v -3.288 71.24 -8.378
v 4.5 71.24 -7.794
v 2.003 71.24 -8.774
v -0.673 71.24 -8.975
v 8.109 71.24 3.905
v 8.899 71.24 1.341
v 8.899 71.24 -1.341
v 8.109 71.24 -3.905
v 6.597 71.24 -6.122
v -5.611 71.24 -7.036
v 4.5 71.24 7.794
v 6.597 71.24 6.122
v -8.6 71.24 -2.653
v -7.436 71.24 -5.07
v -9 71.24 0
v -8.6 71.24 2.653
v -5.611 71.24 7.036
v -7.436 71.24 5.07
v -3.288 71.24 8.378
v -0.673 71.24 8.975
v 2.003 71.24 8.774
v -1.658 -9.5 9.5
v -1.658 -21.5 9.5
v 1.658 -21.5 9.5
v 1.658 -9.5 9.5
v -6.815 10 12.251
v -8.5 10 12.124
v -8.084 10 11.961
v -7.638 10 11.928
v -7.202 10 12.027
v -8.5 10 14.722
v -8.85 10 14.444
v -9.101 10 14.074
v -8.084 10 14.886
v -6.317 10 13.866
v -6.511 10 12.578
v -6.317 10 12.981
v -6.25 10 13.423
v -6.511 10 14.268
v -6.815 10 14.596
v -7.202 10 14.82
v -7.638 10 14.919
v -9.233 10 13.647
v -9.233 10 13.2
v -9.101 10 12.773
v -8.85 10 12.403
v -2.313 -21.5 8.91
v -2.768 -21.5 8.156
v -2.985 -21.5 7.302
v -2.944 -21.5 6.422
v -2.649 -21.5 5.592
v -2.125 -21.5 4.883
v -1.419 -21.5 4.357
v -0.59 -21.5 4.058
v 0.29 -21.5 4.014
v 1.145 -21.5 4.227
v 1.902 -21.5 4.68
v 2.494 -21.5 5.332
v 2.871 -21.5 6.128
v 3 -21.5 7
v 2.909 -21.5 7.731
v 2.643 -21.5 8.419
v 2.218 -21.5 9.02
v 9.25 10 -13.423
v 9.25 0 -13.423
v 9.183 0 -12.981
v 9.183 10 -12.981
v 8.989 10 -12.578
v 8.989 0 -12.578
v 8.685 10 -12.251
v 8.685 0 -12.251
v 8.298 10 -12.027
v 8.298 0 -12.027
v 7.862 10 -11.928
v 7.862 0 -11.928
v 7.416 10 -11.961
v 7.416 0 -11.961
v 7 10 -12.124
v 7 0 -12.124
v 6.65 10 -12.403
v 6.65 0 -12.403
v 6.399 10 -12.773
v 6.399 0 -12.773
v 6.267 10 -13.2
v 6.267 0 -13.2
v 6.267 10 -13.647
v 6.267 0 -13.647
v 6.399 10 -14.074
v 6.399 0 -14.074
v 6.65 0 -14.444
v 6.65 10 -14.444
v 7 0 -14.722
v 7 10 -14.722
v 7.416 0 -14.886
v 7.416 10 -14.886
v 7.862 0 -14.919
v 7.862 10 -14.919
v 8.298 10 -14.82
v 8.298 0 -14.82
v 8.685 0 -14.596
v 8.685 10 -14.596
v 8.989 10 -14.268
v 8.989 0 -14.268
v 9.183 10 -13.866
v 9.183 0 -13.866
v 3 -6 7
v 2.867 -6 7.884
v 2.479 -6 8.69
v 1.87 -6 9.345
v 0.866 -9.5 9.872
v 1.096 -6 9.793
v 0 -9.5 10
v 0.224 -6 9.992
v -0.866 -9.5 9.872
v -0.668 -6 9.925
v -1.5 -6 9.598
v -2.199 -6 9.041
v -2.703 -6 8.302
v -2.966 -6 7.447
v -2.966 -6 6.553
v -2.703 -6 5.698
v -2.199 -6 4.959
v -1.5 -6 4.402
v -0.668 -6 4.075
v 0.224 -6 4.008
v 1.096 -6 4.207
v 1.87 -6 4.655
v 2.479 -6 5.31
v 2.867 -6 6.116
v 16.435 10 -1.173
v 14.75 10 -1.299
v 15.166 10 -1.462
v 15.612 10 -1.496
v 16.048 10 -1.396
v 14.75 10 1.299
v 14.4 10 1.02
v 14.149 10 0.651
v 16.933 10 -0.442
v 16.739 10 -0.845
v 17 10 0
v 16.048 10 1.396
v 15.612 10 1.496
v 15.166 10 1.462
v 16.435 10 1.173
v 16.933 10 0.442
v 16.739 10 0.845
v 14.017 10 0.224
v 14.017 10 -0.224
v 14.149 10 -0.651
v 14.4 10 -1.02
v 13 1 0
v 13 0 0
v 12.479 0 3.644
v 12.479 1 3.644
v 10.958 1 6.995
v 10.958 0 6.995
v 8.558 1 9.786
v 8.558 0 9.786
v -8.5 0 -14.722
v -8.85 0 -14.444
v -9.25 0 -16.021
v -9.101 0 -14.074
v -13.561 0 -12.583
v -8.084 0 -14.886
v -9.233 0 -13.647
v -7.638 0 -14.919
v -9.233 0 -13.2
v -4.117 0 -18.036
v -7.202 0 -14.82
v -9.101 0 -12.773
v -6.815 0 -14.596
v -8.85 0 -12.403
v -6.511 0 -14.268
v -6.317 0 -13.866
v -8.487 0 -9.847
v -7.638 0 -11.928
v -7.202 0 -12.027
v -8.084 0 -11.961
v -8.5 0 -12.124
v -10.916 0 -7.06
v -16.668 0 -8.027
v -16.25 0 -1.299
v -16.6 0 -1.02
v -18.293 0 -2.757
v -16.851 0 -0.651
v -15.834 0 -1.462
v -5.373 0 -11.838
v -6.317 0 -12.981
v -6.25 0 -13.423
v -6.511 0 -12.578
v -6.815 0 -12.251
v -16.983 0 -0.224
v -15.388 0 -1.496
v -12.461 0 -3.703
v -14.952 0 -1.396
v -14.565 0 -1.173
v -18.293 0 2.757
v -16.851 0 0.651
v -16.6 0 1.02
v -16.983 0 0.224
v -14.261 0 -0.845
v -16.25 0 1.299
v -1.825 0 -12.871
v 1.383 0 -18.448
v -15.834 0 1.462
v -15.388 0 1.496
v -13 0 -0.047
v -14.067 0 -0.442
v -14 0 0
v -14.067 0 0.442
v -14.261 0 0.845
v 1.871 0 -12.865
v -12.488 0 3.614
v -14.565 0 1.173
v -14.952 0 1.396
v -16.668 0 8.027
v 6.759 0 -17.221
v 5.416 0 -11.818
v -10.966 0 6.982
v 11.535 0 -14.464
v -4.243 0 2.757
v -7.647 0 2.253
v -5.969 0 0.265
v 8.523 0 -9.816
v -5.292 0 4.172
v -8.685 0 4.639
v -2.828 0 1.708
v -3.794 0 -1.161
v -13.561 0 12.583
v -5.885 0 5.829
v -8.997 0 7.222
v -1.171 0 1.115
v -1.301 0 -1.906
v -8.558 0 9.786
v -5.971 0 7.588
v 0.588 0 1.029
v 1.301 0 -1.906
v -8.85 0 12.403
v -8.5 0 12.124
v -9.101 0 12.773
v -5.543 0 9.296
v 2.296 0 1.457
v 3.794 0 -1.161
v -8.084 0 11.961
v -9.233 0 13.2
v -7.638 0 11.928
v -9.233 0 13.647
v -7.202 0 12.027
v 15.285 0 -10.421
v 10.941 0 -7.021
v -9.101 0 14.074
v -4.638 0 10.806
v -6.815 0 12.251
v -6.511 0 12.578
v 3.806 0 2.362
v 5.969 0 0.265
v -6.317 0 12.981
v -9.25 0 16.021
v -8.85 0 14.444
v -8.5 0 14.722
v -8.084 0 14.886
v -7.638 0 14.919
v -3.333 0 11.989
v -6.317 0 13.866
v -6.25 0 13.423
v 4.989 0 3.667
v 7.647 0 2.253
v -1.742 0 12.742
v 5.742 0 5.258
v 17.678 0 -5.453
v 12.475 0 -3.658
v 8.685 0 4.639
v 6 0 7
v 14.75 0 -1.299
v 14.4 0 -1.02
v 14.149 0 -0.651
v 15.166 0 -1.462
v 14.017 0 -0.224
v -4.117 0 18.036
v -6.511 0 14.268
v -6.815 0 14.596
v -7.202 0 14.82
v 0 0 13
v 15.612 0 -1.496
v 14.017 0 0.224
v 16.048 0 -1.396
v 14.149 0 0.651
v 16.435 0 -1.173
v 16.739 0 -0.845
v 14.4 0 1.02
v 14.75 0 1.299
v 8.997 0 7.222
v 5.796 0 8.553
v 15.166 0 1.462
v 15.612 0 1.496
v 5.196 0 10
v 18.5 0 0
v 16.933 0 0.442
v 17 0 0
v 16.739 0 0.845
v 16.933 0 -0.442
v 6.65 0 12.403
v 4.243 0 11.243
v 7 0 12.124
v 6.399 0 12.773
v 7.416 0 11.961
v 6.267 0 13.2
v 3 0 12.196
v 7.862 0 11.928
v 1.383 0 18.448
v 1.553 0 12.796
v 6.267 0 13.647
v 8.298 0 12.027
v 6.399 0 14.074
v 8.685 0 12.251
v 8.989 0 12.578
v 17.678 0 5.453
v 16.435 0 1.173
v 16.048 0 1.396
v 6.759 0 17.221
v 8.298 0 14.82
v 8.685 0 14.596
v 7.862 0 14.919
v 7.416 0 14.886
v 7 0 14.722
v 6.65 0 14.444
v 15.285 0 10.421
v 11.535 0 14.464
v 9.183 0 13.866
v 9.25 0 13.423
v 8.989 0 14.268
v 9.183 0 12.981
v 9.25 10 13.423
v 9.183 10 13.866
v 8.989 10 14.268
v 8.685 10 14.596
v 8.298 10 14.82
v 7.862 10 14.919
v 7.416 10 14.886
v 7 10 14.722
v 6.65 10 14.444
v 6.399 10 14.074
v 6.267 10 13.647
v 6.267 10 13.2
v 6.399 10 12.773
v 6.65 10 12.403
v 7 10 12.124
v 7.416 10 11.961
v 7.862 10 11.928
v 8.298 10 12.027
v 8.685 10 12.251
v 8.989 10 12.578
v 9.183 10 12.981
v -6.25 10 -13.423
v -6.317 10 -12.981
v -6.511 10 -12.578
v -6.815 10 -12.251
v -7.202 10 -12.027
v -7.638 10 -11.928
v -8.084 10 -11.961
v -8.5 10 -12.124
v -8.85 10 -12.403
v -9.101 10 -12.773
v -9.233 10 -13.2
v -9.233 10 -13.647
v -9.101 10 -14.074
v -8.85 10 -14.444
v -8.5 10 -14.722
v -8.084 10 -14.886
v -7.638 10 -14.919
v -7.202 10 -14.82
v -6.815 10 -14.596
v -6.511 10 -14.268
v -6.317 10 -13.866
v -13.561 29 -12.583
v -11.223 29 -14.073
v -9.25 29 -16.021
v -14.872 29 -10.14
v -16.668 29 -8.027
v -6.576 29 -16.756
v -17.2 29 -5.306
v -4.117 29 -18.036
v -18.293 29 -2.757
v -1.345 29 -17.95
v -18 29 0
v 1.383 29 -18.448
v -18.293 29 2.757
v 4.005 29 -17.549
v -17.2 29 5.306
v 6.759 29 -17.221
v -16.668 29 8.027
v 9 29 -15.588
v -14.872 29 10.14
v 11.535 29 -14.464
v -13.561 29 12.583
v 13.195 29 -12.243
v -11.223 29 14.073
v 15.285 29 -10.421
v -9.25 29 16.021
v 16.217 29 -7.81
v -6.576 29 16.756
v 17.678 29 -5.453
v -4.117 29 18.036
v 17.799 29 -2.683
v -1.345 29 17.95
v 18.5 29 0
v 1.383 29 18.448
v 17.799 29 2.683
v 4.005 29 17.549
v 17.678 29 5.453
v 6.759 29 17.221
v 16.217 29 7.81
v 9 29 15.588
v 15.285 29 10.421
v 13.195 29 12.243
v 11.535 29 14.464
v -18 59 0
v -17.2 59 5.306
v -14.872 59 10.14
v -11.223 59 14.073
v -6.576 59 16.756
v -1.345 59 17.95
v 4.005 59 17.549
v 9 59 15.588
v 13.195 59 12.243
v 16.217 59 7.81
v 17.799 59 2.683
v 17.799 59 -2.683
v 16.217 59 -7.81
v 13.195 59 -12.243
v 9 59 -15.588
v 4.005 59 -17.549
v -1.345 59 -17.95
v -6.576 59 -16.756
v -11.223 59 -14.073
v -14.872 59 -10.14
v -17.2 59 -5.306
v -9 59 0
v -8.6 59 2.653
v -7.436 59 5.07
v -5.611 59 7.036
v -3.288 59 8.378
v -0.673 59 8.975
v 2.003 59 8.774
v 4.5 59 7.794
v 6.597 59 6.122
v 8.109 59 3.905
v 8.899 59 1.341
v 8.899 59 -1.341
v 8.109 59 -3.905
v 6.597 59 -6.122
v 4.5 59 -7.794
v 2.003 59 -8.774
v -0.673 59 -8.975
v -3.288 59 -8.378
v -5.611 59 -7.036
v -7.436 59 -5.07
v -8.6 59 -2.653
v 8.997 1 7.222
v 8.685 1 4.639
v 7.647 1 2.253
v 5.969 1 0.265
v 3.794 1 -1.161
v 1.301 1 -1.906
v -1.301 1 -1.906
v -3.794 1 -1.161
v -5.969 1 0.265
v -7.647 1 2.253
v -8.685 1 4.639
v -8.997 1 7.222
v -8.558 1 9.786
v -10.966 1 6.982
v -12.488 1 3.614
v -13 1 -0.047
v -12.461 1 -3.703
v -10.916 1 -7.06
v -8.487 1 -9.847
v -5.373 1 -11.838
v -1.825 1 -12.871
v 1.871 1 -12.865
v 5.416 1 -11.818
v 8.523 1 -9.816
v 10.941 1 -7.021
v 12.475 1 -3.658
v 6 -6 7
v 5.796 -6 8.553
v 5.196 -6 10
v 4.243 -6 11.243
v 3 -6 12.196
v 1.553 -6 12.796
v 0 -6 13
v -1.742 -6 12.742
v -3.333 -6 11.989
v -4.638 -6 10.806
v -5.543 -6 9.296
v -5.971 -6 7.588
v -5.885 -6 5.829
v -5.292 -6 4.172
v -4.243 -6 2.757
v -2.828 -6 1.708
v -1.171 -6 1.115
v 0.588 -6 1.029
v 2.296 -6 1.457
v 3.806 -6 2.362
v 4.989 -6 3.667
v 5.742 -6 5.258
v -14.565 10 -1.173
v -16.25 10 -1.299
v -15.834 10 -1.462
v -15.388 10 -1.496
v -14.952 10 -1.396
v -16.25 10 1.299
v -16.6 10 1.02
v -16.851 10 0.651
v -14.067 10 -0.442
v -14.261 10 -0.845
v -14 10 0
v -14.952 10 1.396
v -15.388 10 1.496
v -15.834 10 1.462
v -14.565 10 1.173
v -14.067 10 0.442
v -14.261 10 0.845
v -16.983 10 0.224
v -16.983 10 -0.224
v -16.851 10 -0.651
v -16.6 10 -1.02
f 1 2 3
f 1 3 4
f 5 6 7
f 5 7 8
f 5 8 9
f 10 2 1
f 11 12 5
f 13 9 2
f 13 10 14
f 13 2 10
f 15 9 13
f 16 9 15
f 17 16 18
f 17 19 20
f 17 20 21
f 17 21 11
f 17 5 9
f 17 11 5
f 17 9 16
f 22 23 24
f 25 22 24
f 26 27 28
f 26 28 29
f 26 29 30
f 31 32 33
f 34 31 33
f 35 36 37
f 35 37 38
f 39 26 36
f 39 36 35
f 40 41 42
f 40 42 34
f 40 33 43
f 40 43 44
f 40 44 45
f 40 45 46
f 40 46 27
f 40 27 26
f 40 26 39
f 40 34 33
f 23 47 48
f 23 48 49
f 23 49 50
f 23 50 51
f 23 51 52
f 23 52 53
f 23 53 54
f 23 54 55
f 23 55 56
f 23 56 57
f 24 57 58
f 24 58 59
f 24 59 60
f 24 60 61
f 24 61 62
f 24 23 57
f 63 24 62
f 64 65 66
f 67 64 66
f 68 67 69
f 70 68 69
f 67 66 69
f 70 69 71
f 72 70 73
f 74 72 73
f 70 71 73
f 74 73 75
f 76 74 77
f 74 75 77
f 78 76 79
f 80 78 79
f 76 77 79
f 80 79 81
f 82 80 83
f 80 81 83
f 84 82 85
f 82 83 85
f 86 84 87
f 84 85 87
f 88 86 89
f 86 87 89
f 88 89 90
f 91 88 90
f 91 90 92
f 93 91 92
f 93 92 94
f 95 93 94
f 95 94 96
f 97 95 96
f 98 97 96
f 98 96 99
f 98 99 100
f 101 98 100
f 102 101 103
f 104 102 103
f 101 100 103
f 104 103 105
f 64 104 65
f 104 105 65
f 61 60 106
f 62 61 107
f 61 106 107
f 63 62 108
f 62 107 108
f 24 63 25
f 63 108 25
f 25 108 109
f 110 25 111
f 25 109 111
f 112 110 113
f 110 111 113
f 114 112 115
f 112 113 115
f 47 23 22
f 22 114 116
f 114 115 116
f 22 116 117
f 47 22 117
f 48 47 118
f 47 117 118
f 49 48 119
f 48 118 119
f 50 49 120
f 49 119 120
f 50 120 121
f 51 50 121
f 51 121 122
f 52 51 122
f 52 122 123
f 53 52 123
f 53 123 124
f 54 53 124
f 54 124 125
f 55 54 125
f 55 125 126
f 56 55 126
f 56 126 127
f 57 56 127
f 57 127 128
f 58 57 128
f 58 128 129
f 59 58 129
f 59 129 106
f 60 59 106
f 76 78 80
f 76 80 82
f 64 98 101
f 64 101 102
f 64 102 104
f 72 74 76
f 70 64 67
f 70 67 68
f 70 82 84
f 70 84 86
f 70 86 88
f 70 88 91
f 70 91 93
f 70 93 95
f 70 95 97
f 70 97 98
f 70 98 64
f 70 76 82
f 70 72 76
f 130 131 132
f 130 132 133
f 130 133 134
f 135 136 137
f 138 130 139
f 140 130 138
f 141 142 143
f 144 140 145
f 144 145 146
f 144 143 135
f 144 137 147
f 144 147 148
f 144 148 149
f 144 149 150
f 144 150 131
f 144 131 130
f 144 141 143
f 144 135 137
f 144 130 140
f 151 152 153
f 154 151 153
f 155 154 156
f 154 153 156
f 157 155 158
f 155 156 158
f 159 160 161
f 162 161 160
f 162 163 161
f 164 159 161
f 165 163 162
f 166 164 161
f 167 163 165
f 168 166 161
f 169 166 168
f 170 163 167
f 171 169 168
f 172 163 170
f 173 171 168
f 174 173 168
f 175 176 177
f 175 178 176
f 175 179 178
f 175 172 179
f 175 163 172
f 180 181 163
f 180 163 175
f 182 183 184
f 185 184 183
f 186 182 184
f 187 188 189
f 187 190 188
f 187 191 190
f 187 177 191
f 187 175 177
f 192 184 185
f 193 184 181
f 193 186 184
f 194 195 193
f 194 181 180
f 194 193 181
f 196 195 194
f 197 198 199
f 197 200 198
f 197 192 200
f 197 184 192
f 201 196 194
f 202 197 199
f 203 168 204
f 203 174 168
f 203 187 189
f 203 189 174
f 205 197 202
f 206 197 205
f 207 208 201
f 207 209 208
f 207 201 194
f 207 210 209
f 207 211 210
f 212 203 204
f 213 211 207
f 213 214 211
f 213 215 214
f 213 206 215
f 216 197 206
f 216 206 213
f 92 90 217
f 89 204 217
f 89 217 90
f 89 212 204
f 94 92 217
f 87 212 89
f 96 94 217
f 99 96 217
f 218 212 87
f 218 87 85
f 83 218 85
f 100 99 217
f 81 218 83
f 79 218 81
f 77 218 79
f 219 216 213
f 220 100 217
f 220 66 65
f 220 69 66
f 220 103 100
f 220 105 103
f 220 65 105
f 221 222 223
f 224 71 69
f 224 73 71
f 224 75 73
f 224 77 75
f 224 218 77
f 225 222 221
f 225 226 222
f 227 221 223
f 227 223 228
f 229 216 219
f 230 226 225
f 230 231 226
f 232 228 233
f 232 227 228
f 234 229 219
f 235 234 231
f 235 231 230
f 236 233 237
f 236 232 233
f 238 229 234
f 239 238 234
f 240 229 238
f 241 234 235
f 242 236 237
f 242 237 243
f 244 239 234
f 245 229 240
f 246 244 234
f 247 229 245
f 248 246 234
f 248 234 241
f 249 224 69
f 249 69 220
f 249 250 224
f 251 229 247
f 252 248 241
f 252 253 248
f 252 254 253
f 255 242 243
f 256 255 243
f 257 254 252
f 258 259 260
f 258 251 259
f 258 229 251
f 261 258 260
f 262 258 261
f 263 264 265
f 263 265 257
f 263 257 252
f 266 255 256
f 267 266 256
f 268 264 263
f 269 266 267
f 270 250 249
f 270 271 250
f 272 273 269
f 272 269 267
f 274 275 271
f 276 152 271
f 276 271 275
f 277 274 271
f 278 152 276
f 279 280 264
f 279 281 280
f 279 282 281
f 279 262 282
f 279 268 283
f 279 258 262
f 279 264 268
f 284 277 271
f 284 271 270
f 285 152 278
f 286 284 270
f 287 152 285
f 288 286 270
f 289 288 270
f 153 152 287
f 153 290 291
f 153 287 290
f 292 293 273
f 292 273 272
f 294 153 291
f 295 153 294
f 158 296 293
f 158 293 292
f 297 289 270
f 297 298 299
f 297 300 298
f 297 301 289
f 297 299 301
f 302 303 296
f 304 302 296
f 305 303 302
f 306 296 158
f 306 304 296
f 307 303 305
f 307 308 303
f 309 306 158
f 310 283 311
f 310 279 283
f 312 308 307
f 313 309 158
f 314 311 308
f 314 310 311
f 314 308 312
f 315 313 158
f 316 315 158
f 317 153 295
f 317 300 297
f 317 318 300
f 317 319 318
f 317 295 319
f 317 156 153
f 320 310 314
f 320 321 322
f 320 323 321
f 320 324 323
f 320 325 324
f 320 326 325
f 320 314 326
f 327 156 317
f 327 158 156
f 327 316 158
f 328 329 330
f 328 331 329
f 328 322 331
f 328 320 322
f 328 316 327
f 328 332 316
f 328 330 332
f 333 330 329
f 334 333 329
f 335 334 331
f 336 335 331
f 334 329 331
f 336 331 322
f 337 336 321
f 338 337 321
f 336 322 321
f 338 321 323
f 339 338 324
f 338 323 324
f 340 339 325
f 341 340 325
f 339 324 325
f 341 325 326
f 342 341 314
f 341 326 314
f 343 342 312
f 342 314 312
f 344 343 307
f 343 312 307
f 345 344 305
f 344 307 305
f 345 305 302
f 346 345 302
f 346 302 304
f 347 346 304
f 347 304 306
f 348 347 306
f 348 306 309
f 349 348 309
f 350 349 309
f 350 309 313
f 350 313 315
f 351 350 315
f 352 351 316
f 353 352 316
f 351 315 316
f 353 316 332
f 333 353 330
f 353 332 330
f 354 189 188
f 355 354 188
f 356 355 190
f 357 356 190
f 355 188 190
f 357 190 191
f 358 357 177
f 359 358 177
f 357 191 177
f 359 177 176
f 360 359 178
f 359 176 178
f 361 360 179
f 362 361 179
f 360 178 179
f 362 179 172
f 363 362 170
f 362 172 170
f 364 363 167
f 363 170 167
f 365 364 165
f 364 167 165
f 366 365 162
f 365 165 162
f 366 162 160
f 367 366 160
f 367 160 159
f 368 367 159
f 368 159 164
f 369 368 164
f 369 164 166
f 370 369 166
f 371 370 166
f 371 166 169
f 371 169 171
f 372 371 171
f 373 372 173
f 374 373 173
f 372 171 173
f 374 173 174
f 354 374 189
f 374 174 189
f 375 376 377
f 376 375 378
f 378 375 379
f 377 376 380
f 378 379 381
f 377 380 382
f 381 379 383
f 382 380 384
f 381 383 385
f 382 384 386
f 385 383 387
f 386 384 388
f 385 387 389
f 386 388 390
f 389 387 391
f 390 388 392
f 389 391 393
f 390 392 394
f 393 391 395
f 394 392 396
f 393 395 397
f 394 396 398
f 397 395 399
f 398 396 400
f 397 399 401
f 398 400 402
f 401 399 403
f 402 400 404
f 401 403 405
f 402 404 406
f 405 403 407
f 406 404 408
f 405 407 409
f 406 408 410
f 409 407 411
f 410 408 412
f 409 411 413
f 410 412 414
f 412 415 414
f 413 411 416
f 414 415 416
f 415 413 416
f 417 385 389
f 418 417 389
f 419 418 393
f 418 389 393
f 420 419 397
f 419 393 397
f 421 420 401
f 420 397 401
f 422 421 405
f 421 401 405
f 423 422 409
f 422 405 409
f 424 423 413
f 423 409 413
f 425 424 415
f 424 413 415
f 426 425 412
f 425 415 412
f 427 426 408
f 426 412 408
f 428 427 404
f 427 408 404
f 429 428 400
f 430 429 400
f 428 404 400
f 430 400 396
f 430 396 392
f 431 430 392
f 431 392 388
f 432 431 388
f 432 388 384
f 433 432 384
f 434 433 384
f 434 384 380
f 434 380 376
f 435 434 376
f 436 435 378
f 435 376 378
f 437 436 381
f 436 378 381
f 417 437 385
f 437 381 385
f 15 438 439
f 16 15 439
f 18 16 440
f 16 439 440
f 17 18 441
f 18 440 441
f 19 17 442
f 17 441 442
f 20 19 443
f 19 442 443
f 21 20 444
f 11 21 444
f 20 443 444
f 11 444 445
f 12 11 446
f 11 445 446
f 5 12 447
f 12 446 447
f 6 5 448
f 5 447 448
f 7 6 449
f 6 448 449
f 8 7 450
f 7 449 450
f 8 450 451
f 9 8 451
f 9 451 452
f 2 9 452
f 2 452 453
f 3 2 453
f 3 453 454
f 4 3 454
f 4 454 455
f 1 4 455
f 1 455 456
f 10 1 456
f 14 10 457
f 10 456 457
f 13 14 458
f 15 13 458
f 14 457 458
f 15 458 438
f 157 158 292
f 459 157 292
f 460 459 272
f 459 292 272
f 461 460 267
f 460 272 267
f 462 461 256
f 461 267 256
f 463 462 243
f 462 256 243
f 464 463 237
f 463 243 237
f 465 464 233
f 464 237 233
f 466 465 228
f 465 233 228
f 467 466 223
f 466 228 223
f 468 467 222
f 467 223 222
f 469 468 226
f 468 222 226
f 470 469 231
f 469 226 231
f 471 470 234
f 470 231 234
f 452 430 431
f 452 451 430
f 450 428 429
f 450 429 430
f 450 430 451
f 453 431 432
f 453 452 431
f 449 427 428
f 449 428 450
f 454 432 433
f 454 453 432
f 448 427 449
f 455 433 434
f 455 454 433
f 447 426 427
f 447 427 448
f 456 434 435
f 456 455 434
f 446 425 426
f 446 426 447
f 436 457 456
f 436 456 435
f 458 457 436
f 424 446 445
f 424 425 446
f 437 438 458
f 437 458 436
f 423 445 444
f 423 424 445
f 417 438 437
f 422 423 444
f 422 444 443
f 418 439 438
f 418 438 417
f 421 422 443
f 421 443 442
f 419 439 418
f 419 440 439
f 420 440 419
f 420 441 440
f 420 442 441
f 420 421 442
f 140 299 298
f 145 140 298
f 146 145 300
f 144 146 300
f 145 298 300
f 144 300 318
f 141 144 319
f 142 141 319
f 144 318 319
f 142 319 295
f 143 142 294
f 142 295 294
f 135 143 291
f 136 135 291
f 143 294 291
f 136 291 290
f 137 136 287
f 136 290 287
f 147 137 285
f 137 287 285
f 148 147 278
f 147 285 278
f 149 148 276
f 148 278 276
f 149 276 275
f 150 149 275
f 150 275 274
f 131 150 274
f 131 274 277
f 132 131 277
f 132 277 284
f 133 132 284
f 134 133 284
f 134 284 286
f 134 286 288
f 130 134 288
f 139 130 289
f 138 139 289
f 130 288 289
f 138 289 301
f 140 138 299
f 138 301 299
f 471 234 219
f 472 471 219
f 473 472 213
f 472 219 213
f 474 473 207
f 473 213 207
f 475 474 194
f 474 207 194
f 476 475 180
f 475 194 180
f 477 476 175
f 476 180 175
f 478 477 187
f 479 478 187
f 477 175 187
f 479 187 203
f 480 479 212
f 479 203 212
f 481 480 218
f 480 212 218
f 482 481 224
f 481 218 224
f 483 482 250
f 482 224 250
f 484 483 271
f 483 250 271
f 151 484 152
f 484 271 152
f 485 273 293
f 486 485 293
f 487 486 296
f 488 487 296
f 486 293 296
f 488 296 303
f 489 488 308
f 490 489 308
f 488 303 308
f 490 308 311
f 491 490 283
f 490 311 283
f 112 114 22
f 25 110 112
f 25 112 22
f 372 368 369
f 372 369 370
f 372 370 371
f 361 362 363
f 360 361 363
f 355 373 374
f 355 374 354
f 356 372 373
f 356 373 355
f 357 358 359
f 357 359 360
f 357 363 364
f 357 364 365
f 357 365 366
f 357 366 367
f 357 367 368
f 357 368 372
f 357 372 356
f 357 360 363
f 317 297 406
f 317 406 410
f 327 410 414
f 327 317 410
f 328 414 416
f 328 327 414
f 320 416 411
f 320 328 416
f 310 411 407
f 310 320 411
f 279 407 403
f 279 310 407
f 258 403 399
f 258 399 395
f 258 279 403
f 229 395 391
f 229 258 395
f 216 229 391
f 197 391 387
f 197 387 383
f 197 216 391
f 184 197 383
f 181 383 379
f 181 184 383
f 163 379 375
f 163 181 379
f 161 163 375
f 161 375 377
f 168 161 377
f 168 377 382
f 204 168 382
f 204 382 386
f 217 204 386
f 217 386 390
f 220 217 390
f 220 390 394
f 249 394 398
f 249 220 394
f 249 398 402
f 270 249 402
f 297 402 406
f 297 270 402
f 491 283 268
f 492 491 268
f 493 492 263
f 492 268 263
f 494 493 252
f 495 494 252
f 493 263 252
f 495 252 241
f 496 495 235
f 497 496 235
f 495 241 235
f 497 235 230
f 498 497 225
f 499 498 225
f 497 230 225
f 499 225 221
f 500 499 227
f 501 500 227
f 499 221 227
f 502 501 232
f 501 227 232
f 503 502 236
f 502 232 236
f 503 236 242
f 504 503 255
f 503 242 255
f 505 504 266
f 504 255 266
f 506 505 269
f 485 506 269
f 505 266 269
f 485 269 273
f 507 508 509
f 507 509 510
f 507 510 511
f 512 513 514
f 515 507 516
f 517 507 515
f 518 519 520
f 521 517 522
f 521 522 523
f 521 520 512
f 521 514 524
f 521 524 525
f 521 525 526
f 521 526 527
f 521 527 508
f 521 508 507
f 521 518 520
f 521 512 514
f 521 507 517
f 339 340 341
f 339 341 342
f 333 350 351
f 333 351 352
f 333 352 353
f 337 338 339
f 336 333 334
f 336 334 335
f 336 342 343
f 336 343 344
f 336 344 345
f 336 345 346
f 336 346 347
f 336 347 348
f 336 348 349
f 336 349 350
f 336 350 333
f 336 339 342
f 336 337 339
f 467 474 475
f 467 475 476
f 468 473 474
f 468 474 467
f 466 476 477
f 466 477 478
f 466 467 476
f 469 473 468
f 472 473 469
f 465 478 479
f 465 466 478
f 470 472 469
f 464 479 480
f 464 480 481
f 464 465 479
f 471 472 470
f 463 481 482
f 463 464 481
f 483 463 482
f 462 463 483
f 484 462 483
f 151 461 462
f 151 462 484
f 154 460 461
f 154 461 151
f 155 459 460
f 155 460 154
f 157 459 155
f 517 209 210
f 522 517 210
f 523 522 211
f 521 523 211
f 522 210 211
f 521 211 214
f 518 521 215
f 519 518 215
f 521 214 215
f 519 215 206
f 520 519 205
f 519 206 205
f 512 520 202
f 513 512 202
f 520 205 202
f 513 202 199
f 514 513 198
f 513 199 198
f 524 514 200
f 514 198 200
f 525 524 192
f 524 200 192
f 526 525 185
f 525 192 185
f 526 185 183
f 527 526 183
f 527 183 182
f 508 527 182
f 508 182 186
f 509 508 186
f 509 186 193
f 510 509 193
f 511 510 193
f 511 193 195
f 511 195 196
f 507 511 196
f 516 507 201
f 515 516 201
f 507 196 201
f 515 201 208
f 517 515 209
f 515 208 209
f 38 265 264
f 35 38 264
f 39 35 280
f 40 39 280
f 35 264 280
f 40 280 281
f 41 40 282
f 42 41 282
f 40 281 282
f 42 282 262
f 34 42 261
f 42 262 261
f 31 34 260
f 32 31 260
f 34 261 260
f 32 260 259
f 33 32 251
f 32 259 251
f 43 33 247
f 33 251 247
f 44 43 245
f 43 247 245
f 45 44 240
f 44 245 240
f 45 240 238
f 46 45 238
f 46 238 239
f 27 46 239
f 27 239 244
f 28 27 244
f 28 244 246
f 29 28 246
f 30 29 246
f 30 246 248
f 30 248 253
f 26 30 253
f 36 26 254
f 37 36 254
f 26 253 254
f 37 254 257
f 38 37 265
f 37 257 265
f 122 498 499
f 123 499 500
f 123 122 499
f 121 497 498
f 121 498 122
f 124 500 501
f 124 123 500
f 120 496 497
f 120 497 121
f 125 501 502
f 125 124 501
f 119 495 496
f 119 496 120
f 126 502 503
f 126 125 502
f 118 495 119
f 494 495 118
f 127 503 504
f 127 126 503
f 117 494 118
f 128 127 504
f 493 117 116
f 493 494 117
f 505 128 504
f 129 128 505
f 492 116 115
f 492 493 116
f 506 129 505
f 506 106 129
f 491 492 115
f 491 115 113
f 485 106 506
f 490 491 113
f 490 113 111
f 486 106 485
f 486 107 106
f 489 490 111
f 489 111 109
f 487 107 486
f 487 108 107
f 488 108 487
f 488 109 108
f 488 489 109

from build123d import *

# Parameters (mm, degrees)
F0_R      = 18.5
F0_R_2    = 18
F0_R_3    = 1.5
F0_R_4    = 3
F1_DEPTH  = 29
F2_R      = 18
F3_DEPTH  = 30
F4_R      = 9
F5_DEPTH  = 12.24
F6_DEPTH  = 6
F7_DEPTH  = 21.5
F8_DEPTH  = 10
F10_DEPTH = 12
F11_DEPTH = 1


with BuildPart() as f1:
    # F0 (on Front) → F1 (new body)
    with BuildSketch(Plane.XZ):
        Circle(F0_R)
        Circle(F0_R_2, mode=Mode.SUBTRACT)
        Circle(F0_R_2)
        with Locations((-7.75, -13.4233937587)):
            Circle(F0_R_3, mode=Mode.SUBTRACT)
        with Locations((7.75, -13.4233937587)):
            Circle(F0_R_3, mode=Mode.SUBTRACT)
        with Locations((-15.5, 0)):
            Circle(F0_R_3, mode=Mode.SUBTRACT)
        with Locations((-7.75, 13.4233937587)):
            Circle(F0_R_3, mode=Mode.SUBTRACT)
        with BuildLine():
            ThreePointArc((-8.5580252347, 9.7857142857), (-4.5708705218, 12.1699278007), (-4.3e-08, 13))
            ThreePointArc((-4.3e-08, 13), (4.5708704815, 12.1699278158), (8.5580252347, 9.7857142857))
            ThreePointArc((8.5580252347, 9.7857142857), (11.8375320074, 5.3733449521), (13, 0))
            ThreePointArc((13, 0), (-5.3733449521, -11.8375320074), (-8.5580252347, 9.7857142857))
        make_face(mode=Mode.SUBTRACT)
        with Locations((15.5, 0)):
            Circle(F0_R_3, mode=Mode.SUBTRACT)
        with Locations((7.75, 13.4233937587)):
            Circle(F0_R_3, mode=Mode.SUBTRACT)
        with BuildLine():
            ThreePointArc((13, 0), (11.8375320074, 5.3733449521), (8.5580252347, 9.7857142857))
            ThreePointArc((8.5580252347, 9.7857142857), (0, -2), (-8.5580252347, 9.7857142857))
            ThreePointArc((-8.5580252347, 9.7857142857), (-5.3733449521, -11.8375320074), (13, 0))
        make_face()
        with BuildLine():
            ThreePointArc((8.5580252347, 9.7857142857), (4.5708704815, 12.1699278158), (-4.3e-08, 13))
            ThreePointArc((-4.3e-08, 13), (-4.5708705218, 12.1699278007), (-8.5580252347, 9.7857142857))
            ThreePointArc((-8.5580252347, 9.7857142857), (0, -2), (8.5580252347, 9.7857142857))
        make_face()
        with BuildLine():
            ThreePointArc((-4.3e-08, 13), (4.2426406719, 11.2426407023), (6, 7))
            ThreePointArc((6, 7), (-4.2426406719, 2.7573592977), (-4.3e-08, 13))
        make_face(mode=Mode.SUBTRACT)
        with BuildLine():
            ThreePointArc((-4.3e-08, 13), (-4.2426406719, 2.7573592977), (6, 7))
            ThreePointArc((6, 7), (4.2426406719, 11.2426407023), (-4.3e-08, 13))
        make_face()
        with Locations((0, 7)):
            Circle(F0_R_4, mode=Mode.SUBTRACT)
        with Locations((0, 7)):
            Circle(F0_R_4)
        with Locations((-15.5, 0)):
            Circle(F0_R_3)
        with Locations((7.75, -13.4233937587)):
            Circle(F0_R_3)
        with Locations((15.5, 0)):
            Circle(F0_R_3)
        with Locations((7.75, 13.4233937587)):
            Circle(F0_R_3)
        with Locations((-7.75, -13.4233937587)):
            Circle(F0_R_3)
        with Locations((-7.75, 13.4233937587)):
            Circle(F0_R_3)
    extrude(amount=-F1_DEPTH)

    # F2 (on face) → F3 (join)
    with BuildSketch(Plane(origin=(0, 29, 0), x_dir=(-1, 0, 0), z_dir=(0, 1, 0))):
        Circle(F2_R)
    extrude(amount=F3_DEPTH)

    # F4 (on face) → F5 (join)
    with BuildSketch(Plane(origin=(0, 59, 0), x_dir=(-1, 0, 0), z_dir=(0, 1, 0))):
        Circle(F4_R)
    extrude(amount=F5_DEPTH)

    # F0 (on Front) → F6 (join)
    with BuildSketch(Plane.XZ):
        with BuildLine():
            ThreePointArc((-4.3e-08, 13), (-4.2426406719, 2.7573592977), (6, 7))
            ThreePointArc((6, 7), (4.2426406719, 11.2426407023), (-4.3e-08, 13))
        make_face()
        with Locations((0, 7)):
            Circle(F0_R_4, mode=Mode.SUBTRACT)
    extrude(amount=F6_DEPTH)

    # F0 (on Front) → F7 (join)
    with BuildSketch(Plane.XZ):
        with Locations((0, 7)):
            Circle(F0_R_4)
    extrude(amount=F7_DEPTH)

    # F0 (on Front) → F8 (cut)
    with BuildSketch(Plane.XZ):
        with Locations((-7.75, 13.4233937587)):
            Circle(F0_R_3)
        with Locations((7.75, 13.4233937587)):
            Circle(F0_R_3)
        with Locations((15.5, 0)):
            Circle(F0_R_3)
        with Locations((-7.75, -13.4233937587)):
            Circle(F0_R_3)
        with Locations((-15.5, 0)):
            Circle(F0_R_3)
        with Locations((7.75, -13.4233937587)):
            Circle(F0_R_3)
    extrude(amount=-F8_DEPTH, mode=Mode.SUBTRACT)

    # F9 (on face) → F10 (cut)
    with BuildSketch(Plane.XZ.offset(21.5)):
        with BuildLine():
            ThreePointArc((-1.6583123952, 9.5), (0, 10), (1.6583123952, 9.5))
            Line((1.6583123952, 9.5), (6.0122050345, 9.5))
            Line((6.0122050345, 9.5), (6.0122050345, 13.4357631467))
            Line((6.0122050345, 13.4357631467), (-7.3503456078, 13.4357631467))
            Line((-7.3503456078, 13.4357631467), (-7.3503456078, 9.5))
            Line((-7.3503456078, 9.5), (-1.6583123952, 9.5))
        make_face()
        with BuildLine():
            Line((-1.6583123952, 9.5), (1.6583123952, 9.5))
            ThreePointArc((1.6583123952, 9.5), (0, 10), (-1.6583123952, 9.5))
        make_face()
    extrude(amount=-F10_DEPTH, mode=Mode.SUBTRACT)

    # F0 (on Front) → F11 (cut)
    with BuildSketch(Plane.XZ):
        with BuildLine():
            ThreePointArc((13, 0), (11.8375320074, 5.3733449521), (8.5580252347, 9.7857142857))
            ThreePointArc((8.5580252347, 9.7857142857), (0, -2), (-8.5580252347, 9.7857142857))
            ThreePointArc((-8.5580252347, 9.7857142857), (-5.3733449521, -11.8375320074), (13, 0))
        make_face()
    extrude(amount=-F11_DEPTH, mode=Mode.SUBTRACT)


solid = f1.part
